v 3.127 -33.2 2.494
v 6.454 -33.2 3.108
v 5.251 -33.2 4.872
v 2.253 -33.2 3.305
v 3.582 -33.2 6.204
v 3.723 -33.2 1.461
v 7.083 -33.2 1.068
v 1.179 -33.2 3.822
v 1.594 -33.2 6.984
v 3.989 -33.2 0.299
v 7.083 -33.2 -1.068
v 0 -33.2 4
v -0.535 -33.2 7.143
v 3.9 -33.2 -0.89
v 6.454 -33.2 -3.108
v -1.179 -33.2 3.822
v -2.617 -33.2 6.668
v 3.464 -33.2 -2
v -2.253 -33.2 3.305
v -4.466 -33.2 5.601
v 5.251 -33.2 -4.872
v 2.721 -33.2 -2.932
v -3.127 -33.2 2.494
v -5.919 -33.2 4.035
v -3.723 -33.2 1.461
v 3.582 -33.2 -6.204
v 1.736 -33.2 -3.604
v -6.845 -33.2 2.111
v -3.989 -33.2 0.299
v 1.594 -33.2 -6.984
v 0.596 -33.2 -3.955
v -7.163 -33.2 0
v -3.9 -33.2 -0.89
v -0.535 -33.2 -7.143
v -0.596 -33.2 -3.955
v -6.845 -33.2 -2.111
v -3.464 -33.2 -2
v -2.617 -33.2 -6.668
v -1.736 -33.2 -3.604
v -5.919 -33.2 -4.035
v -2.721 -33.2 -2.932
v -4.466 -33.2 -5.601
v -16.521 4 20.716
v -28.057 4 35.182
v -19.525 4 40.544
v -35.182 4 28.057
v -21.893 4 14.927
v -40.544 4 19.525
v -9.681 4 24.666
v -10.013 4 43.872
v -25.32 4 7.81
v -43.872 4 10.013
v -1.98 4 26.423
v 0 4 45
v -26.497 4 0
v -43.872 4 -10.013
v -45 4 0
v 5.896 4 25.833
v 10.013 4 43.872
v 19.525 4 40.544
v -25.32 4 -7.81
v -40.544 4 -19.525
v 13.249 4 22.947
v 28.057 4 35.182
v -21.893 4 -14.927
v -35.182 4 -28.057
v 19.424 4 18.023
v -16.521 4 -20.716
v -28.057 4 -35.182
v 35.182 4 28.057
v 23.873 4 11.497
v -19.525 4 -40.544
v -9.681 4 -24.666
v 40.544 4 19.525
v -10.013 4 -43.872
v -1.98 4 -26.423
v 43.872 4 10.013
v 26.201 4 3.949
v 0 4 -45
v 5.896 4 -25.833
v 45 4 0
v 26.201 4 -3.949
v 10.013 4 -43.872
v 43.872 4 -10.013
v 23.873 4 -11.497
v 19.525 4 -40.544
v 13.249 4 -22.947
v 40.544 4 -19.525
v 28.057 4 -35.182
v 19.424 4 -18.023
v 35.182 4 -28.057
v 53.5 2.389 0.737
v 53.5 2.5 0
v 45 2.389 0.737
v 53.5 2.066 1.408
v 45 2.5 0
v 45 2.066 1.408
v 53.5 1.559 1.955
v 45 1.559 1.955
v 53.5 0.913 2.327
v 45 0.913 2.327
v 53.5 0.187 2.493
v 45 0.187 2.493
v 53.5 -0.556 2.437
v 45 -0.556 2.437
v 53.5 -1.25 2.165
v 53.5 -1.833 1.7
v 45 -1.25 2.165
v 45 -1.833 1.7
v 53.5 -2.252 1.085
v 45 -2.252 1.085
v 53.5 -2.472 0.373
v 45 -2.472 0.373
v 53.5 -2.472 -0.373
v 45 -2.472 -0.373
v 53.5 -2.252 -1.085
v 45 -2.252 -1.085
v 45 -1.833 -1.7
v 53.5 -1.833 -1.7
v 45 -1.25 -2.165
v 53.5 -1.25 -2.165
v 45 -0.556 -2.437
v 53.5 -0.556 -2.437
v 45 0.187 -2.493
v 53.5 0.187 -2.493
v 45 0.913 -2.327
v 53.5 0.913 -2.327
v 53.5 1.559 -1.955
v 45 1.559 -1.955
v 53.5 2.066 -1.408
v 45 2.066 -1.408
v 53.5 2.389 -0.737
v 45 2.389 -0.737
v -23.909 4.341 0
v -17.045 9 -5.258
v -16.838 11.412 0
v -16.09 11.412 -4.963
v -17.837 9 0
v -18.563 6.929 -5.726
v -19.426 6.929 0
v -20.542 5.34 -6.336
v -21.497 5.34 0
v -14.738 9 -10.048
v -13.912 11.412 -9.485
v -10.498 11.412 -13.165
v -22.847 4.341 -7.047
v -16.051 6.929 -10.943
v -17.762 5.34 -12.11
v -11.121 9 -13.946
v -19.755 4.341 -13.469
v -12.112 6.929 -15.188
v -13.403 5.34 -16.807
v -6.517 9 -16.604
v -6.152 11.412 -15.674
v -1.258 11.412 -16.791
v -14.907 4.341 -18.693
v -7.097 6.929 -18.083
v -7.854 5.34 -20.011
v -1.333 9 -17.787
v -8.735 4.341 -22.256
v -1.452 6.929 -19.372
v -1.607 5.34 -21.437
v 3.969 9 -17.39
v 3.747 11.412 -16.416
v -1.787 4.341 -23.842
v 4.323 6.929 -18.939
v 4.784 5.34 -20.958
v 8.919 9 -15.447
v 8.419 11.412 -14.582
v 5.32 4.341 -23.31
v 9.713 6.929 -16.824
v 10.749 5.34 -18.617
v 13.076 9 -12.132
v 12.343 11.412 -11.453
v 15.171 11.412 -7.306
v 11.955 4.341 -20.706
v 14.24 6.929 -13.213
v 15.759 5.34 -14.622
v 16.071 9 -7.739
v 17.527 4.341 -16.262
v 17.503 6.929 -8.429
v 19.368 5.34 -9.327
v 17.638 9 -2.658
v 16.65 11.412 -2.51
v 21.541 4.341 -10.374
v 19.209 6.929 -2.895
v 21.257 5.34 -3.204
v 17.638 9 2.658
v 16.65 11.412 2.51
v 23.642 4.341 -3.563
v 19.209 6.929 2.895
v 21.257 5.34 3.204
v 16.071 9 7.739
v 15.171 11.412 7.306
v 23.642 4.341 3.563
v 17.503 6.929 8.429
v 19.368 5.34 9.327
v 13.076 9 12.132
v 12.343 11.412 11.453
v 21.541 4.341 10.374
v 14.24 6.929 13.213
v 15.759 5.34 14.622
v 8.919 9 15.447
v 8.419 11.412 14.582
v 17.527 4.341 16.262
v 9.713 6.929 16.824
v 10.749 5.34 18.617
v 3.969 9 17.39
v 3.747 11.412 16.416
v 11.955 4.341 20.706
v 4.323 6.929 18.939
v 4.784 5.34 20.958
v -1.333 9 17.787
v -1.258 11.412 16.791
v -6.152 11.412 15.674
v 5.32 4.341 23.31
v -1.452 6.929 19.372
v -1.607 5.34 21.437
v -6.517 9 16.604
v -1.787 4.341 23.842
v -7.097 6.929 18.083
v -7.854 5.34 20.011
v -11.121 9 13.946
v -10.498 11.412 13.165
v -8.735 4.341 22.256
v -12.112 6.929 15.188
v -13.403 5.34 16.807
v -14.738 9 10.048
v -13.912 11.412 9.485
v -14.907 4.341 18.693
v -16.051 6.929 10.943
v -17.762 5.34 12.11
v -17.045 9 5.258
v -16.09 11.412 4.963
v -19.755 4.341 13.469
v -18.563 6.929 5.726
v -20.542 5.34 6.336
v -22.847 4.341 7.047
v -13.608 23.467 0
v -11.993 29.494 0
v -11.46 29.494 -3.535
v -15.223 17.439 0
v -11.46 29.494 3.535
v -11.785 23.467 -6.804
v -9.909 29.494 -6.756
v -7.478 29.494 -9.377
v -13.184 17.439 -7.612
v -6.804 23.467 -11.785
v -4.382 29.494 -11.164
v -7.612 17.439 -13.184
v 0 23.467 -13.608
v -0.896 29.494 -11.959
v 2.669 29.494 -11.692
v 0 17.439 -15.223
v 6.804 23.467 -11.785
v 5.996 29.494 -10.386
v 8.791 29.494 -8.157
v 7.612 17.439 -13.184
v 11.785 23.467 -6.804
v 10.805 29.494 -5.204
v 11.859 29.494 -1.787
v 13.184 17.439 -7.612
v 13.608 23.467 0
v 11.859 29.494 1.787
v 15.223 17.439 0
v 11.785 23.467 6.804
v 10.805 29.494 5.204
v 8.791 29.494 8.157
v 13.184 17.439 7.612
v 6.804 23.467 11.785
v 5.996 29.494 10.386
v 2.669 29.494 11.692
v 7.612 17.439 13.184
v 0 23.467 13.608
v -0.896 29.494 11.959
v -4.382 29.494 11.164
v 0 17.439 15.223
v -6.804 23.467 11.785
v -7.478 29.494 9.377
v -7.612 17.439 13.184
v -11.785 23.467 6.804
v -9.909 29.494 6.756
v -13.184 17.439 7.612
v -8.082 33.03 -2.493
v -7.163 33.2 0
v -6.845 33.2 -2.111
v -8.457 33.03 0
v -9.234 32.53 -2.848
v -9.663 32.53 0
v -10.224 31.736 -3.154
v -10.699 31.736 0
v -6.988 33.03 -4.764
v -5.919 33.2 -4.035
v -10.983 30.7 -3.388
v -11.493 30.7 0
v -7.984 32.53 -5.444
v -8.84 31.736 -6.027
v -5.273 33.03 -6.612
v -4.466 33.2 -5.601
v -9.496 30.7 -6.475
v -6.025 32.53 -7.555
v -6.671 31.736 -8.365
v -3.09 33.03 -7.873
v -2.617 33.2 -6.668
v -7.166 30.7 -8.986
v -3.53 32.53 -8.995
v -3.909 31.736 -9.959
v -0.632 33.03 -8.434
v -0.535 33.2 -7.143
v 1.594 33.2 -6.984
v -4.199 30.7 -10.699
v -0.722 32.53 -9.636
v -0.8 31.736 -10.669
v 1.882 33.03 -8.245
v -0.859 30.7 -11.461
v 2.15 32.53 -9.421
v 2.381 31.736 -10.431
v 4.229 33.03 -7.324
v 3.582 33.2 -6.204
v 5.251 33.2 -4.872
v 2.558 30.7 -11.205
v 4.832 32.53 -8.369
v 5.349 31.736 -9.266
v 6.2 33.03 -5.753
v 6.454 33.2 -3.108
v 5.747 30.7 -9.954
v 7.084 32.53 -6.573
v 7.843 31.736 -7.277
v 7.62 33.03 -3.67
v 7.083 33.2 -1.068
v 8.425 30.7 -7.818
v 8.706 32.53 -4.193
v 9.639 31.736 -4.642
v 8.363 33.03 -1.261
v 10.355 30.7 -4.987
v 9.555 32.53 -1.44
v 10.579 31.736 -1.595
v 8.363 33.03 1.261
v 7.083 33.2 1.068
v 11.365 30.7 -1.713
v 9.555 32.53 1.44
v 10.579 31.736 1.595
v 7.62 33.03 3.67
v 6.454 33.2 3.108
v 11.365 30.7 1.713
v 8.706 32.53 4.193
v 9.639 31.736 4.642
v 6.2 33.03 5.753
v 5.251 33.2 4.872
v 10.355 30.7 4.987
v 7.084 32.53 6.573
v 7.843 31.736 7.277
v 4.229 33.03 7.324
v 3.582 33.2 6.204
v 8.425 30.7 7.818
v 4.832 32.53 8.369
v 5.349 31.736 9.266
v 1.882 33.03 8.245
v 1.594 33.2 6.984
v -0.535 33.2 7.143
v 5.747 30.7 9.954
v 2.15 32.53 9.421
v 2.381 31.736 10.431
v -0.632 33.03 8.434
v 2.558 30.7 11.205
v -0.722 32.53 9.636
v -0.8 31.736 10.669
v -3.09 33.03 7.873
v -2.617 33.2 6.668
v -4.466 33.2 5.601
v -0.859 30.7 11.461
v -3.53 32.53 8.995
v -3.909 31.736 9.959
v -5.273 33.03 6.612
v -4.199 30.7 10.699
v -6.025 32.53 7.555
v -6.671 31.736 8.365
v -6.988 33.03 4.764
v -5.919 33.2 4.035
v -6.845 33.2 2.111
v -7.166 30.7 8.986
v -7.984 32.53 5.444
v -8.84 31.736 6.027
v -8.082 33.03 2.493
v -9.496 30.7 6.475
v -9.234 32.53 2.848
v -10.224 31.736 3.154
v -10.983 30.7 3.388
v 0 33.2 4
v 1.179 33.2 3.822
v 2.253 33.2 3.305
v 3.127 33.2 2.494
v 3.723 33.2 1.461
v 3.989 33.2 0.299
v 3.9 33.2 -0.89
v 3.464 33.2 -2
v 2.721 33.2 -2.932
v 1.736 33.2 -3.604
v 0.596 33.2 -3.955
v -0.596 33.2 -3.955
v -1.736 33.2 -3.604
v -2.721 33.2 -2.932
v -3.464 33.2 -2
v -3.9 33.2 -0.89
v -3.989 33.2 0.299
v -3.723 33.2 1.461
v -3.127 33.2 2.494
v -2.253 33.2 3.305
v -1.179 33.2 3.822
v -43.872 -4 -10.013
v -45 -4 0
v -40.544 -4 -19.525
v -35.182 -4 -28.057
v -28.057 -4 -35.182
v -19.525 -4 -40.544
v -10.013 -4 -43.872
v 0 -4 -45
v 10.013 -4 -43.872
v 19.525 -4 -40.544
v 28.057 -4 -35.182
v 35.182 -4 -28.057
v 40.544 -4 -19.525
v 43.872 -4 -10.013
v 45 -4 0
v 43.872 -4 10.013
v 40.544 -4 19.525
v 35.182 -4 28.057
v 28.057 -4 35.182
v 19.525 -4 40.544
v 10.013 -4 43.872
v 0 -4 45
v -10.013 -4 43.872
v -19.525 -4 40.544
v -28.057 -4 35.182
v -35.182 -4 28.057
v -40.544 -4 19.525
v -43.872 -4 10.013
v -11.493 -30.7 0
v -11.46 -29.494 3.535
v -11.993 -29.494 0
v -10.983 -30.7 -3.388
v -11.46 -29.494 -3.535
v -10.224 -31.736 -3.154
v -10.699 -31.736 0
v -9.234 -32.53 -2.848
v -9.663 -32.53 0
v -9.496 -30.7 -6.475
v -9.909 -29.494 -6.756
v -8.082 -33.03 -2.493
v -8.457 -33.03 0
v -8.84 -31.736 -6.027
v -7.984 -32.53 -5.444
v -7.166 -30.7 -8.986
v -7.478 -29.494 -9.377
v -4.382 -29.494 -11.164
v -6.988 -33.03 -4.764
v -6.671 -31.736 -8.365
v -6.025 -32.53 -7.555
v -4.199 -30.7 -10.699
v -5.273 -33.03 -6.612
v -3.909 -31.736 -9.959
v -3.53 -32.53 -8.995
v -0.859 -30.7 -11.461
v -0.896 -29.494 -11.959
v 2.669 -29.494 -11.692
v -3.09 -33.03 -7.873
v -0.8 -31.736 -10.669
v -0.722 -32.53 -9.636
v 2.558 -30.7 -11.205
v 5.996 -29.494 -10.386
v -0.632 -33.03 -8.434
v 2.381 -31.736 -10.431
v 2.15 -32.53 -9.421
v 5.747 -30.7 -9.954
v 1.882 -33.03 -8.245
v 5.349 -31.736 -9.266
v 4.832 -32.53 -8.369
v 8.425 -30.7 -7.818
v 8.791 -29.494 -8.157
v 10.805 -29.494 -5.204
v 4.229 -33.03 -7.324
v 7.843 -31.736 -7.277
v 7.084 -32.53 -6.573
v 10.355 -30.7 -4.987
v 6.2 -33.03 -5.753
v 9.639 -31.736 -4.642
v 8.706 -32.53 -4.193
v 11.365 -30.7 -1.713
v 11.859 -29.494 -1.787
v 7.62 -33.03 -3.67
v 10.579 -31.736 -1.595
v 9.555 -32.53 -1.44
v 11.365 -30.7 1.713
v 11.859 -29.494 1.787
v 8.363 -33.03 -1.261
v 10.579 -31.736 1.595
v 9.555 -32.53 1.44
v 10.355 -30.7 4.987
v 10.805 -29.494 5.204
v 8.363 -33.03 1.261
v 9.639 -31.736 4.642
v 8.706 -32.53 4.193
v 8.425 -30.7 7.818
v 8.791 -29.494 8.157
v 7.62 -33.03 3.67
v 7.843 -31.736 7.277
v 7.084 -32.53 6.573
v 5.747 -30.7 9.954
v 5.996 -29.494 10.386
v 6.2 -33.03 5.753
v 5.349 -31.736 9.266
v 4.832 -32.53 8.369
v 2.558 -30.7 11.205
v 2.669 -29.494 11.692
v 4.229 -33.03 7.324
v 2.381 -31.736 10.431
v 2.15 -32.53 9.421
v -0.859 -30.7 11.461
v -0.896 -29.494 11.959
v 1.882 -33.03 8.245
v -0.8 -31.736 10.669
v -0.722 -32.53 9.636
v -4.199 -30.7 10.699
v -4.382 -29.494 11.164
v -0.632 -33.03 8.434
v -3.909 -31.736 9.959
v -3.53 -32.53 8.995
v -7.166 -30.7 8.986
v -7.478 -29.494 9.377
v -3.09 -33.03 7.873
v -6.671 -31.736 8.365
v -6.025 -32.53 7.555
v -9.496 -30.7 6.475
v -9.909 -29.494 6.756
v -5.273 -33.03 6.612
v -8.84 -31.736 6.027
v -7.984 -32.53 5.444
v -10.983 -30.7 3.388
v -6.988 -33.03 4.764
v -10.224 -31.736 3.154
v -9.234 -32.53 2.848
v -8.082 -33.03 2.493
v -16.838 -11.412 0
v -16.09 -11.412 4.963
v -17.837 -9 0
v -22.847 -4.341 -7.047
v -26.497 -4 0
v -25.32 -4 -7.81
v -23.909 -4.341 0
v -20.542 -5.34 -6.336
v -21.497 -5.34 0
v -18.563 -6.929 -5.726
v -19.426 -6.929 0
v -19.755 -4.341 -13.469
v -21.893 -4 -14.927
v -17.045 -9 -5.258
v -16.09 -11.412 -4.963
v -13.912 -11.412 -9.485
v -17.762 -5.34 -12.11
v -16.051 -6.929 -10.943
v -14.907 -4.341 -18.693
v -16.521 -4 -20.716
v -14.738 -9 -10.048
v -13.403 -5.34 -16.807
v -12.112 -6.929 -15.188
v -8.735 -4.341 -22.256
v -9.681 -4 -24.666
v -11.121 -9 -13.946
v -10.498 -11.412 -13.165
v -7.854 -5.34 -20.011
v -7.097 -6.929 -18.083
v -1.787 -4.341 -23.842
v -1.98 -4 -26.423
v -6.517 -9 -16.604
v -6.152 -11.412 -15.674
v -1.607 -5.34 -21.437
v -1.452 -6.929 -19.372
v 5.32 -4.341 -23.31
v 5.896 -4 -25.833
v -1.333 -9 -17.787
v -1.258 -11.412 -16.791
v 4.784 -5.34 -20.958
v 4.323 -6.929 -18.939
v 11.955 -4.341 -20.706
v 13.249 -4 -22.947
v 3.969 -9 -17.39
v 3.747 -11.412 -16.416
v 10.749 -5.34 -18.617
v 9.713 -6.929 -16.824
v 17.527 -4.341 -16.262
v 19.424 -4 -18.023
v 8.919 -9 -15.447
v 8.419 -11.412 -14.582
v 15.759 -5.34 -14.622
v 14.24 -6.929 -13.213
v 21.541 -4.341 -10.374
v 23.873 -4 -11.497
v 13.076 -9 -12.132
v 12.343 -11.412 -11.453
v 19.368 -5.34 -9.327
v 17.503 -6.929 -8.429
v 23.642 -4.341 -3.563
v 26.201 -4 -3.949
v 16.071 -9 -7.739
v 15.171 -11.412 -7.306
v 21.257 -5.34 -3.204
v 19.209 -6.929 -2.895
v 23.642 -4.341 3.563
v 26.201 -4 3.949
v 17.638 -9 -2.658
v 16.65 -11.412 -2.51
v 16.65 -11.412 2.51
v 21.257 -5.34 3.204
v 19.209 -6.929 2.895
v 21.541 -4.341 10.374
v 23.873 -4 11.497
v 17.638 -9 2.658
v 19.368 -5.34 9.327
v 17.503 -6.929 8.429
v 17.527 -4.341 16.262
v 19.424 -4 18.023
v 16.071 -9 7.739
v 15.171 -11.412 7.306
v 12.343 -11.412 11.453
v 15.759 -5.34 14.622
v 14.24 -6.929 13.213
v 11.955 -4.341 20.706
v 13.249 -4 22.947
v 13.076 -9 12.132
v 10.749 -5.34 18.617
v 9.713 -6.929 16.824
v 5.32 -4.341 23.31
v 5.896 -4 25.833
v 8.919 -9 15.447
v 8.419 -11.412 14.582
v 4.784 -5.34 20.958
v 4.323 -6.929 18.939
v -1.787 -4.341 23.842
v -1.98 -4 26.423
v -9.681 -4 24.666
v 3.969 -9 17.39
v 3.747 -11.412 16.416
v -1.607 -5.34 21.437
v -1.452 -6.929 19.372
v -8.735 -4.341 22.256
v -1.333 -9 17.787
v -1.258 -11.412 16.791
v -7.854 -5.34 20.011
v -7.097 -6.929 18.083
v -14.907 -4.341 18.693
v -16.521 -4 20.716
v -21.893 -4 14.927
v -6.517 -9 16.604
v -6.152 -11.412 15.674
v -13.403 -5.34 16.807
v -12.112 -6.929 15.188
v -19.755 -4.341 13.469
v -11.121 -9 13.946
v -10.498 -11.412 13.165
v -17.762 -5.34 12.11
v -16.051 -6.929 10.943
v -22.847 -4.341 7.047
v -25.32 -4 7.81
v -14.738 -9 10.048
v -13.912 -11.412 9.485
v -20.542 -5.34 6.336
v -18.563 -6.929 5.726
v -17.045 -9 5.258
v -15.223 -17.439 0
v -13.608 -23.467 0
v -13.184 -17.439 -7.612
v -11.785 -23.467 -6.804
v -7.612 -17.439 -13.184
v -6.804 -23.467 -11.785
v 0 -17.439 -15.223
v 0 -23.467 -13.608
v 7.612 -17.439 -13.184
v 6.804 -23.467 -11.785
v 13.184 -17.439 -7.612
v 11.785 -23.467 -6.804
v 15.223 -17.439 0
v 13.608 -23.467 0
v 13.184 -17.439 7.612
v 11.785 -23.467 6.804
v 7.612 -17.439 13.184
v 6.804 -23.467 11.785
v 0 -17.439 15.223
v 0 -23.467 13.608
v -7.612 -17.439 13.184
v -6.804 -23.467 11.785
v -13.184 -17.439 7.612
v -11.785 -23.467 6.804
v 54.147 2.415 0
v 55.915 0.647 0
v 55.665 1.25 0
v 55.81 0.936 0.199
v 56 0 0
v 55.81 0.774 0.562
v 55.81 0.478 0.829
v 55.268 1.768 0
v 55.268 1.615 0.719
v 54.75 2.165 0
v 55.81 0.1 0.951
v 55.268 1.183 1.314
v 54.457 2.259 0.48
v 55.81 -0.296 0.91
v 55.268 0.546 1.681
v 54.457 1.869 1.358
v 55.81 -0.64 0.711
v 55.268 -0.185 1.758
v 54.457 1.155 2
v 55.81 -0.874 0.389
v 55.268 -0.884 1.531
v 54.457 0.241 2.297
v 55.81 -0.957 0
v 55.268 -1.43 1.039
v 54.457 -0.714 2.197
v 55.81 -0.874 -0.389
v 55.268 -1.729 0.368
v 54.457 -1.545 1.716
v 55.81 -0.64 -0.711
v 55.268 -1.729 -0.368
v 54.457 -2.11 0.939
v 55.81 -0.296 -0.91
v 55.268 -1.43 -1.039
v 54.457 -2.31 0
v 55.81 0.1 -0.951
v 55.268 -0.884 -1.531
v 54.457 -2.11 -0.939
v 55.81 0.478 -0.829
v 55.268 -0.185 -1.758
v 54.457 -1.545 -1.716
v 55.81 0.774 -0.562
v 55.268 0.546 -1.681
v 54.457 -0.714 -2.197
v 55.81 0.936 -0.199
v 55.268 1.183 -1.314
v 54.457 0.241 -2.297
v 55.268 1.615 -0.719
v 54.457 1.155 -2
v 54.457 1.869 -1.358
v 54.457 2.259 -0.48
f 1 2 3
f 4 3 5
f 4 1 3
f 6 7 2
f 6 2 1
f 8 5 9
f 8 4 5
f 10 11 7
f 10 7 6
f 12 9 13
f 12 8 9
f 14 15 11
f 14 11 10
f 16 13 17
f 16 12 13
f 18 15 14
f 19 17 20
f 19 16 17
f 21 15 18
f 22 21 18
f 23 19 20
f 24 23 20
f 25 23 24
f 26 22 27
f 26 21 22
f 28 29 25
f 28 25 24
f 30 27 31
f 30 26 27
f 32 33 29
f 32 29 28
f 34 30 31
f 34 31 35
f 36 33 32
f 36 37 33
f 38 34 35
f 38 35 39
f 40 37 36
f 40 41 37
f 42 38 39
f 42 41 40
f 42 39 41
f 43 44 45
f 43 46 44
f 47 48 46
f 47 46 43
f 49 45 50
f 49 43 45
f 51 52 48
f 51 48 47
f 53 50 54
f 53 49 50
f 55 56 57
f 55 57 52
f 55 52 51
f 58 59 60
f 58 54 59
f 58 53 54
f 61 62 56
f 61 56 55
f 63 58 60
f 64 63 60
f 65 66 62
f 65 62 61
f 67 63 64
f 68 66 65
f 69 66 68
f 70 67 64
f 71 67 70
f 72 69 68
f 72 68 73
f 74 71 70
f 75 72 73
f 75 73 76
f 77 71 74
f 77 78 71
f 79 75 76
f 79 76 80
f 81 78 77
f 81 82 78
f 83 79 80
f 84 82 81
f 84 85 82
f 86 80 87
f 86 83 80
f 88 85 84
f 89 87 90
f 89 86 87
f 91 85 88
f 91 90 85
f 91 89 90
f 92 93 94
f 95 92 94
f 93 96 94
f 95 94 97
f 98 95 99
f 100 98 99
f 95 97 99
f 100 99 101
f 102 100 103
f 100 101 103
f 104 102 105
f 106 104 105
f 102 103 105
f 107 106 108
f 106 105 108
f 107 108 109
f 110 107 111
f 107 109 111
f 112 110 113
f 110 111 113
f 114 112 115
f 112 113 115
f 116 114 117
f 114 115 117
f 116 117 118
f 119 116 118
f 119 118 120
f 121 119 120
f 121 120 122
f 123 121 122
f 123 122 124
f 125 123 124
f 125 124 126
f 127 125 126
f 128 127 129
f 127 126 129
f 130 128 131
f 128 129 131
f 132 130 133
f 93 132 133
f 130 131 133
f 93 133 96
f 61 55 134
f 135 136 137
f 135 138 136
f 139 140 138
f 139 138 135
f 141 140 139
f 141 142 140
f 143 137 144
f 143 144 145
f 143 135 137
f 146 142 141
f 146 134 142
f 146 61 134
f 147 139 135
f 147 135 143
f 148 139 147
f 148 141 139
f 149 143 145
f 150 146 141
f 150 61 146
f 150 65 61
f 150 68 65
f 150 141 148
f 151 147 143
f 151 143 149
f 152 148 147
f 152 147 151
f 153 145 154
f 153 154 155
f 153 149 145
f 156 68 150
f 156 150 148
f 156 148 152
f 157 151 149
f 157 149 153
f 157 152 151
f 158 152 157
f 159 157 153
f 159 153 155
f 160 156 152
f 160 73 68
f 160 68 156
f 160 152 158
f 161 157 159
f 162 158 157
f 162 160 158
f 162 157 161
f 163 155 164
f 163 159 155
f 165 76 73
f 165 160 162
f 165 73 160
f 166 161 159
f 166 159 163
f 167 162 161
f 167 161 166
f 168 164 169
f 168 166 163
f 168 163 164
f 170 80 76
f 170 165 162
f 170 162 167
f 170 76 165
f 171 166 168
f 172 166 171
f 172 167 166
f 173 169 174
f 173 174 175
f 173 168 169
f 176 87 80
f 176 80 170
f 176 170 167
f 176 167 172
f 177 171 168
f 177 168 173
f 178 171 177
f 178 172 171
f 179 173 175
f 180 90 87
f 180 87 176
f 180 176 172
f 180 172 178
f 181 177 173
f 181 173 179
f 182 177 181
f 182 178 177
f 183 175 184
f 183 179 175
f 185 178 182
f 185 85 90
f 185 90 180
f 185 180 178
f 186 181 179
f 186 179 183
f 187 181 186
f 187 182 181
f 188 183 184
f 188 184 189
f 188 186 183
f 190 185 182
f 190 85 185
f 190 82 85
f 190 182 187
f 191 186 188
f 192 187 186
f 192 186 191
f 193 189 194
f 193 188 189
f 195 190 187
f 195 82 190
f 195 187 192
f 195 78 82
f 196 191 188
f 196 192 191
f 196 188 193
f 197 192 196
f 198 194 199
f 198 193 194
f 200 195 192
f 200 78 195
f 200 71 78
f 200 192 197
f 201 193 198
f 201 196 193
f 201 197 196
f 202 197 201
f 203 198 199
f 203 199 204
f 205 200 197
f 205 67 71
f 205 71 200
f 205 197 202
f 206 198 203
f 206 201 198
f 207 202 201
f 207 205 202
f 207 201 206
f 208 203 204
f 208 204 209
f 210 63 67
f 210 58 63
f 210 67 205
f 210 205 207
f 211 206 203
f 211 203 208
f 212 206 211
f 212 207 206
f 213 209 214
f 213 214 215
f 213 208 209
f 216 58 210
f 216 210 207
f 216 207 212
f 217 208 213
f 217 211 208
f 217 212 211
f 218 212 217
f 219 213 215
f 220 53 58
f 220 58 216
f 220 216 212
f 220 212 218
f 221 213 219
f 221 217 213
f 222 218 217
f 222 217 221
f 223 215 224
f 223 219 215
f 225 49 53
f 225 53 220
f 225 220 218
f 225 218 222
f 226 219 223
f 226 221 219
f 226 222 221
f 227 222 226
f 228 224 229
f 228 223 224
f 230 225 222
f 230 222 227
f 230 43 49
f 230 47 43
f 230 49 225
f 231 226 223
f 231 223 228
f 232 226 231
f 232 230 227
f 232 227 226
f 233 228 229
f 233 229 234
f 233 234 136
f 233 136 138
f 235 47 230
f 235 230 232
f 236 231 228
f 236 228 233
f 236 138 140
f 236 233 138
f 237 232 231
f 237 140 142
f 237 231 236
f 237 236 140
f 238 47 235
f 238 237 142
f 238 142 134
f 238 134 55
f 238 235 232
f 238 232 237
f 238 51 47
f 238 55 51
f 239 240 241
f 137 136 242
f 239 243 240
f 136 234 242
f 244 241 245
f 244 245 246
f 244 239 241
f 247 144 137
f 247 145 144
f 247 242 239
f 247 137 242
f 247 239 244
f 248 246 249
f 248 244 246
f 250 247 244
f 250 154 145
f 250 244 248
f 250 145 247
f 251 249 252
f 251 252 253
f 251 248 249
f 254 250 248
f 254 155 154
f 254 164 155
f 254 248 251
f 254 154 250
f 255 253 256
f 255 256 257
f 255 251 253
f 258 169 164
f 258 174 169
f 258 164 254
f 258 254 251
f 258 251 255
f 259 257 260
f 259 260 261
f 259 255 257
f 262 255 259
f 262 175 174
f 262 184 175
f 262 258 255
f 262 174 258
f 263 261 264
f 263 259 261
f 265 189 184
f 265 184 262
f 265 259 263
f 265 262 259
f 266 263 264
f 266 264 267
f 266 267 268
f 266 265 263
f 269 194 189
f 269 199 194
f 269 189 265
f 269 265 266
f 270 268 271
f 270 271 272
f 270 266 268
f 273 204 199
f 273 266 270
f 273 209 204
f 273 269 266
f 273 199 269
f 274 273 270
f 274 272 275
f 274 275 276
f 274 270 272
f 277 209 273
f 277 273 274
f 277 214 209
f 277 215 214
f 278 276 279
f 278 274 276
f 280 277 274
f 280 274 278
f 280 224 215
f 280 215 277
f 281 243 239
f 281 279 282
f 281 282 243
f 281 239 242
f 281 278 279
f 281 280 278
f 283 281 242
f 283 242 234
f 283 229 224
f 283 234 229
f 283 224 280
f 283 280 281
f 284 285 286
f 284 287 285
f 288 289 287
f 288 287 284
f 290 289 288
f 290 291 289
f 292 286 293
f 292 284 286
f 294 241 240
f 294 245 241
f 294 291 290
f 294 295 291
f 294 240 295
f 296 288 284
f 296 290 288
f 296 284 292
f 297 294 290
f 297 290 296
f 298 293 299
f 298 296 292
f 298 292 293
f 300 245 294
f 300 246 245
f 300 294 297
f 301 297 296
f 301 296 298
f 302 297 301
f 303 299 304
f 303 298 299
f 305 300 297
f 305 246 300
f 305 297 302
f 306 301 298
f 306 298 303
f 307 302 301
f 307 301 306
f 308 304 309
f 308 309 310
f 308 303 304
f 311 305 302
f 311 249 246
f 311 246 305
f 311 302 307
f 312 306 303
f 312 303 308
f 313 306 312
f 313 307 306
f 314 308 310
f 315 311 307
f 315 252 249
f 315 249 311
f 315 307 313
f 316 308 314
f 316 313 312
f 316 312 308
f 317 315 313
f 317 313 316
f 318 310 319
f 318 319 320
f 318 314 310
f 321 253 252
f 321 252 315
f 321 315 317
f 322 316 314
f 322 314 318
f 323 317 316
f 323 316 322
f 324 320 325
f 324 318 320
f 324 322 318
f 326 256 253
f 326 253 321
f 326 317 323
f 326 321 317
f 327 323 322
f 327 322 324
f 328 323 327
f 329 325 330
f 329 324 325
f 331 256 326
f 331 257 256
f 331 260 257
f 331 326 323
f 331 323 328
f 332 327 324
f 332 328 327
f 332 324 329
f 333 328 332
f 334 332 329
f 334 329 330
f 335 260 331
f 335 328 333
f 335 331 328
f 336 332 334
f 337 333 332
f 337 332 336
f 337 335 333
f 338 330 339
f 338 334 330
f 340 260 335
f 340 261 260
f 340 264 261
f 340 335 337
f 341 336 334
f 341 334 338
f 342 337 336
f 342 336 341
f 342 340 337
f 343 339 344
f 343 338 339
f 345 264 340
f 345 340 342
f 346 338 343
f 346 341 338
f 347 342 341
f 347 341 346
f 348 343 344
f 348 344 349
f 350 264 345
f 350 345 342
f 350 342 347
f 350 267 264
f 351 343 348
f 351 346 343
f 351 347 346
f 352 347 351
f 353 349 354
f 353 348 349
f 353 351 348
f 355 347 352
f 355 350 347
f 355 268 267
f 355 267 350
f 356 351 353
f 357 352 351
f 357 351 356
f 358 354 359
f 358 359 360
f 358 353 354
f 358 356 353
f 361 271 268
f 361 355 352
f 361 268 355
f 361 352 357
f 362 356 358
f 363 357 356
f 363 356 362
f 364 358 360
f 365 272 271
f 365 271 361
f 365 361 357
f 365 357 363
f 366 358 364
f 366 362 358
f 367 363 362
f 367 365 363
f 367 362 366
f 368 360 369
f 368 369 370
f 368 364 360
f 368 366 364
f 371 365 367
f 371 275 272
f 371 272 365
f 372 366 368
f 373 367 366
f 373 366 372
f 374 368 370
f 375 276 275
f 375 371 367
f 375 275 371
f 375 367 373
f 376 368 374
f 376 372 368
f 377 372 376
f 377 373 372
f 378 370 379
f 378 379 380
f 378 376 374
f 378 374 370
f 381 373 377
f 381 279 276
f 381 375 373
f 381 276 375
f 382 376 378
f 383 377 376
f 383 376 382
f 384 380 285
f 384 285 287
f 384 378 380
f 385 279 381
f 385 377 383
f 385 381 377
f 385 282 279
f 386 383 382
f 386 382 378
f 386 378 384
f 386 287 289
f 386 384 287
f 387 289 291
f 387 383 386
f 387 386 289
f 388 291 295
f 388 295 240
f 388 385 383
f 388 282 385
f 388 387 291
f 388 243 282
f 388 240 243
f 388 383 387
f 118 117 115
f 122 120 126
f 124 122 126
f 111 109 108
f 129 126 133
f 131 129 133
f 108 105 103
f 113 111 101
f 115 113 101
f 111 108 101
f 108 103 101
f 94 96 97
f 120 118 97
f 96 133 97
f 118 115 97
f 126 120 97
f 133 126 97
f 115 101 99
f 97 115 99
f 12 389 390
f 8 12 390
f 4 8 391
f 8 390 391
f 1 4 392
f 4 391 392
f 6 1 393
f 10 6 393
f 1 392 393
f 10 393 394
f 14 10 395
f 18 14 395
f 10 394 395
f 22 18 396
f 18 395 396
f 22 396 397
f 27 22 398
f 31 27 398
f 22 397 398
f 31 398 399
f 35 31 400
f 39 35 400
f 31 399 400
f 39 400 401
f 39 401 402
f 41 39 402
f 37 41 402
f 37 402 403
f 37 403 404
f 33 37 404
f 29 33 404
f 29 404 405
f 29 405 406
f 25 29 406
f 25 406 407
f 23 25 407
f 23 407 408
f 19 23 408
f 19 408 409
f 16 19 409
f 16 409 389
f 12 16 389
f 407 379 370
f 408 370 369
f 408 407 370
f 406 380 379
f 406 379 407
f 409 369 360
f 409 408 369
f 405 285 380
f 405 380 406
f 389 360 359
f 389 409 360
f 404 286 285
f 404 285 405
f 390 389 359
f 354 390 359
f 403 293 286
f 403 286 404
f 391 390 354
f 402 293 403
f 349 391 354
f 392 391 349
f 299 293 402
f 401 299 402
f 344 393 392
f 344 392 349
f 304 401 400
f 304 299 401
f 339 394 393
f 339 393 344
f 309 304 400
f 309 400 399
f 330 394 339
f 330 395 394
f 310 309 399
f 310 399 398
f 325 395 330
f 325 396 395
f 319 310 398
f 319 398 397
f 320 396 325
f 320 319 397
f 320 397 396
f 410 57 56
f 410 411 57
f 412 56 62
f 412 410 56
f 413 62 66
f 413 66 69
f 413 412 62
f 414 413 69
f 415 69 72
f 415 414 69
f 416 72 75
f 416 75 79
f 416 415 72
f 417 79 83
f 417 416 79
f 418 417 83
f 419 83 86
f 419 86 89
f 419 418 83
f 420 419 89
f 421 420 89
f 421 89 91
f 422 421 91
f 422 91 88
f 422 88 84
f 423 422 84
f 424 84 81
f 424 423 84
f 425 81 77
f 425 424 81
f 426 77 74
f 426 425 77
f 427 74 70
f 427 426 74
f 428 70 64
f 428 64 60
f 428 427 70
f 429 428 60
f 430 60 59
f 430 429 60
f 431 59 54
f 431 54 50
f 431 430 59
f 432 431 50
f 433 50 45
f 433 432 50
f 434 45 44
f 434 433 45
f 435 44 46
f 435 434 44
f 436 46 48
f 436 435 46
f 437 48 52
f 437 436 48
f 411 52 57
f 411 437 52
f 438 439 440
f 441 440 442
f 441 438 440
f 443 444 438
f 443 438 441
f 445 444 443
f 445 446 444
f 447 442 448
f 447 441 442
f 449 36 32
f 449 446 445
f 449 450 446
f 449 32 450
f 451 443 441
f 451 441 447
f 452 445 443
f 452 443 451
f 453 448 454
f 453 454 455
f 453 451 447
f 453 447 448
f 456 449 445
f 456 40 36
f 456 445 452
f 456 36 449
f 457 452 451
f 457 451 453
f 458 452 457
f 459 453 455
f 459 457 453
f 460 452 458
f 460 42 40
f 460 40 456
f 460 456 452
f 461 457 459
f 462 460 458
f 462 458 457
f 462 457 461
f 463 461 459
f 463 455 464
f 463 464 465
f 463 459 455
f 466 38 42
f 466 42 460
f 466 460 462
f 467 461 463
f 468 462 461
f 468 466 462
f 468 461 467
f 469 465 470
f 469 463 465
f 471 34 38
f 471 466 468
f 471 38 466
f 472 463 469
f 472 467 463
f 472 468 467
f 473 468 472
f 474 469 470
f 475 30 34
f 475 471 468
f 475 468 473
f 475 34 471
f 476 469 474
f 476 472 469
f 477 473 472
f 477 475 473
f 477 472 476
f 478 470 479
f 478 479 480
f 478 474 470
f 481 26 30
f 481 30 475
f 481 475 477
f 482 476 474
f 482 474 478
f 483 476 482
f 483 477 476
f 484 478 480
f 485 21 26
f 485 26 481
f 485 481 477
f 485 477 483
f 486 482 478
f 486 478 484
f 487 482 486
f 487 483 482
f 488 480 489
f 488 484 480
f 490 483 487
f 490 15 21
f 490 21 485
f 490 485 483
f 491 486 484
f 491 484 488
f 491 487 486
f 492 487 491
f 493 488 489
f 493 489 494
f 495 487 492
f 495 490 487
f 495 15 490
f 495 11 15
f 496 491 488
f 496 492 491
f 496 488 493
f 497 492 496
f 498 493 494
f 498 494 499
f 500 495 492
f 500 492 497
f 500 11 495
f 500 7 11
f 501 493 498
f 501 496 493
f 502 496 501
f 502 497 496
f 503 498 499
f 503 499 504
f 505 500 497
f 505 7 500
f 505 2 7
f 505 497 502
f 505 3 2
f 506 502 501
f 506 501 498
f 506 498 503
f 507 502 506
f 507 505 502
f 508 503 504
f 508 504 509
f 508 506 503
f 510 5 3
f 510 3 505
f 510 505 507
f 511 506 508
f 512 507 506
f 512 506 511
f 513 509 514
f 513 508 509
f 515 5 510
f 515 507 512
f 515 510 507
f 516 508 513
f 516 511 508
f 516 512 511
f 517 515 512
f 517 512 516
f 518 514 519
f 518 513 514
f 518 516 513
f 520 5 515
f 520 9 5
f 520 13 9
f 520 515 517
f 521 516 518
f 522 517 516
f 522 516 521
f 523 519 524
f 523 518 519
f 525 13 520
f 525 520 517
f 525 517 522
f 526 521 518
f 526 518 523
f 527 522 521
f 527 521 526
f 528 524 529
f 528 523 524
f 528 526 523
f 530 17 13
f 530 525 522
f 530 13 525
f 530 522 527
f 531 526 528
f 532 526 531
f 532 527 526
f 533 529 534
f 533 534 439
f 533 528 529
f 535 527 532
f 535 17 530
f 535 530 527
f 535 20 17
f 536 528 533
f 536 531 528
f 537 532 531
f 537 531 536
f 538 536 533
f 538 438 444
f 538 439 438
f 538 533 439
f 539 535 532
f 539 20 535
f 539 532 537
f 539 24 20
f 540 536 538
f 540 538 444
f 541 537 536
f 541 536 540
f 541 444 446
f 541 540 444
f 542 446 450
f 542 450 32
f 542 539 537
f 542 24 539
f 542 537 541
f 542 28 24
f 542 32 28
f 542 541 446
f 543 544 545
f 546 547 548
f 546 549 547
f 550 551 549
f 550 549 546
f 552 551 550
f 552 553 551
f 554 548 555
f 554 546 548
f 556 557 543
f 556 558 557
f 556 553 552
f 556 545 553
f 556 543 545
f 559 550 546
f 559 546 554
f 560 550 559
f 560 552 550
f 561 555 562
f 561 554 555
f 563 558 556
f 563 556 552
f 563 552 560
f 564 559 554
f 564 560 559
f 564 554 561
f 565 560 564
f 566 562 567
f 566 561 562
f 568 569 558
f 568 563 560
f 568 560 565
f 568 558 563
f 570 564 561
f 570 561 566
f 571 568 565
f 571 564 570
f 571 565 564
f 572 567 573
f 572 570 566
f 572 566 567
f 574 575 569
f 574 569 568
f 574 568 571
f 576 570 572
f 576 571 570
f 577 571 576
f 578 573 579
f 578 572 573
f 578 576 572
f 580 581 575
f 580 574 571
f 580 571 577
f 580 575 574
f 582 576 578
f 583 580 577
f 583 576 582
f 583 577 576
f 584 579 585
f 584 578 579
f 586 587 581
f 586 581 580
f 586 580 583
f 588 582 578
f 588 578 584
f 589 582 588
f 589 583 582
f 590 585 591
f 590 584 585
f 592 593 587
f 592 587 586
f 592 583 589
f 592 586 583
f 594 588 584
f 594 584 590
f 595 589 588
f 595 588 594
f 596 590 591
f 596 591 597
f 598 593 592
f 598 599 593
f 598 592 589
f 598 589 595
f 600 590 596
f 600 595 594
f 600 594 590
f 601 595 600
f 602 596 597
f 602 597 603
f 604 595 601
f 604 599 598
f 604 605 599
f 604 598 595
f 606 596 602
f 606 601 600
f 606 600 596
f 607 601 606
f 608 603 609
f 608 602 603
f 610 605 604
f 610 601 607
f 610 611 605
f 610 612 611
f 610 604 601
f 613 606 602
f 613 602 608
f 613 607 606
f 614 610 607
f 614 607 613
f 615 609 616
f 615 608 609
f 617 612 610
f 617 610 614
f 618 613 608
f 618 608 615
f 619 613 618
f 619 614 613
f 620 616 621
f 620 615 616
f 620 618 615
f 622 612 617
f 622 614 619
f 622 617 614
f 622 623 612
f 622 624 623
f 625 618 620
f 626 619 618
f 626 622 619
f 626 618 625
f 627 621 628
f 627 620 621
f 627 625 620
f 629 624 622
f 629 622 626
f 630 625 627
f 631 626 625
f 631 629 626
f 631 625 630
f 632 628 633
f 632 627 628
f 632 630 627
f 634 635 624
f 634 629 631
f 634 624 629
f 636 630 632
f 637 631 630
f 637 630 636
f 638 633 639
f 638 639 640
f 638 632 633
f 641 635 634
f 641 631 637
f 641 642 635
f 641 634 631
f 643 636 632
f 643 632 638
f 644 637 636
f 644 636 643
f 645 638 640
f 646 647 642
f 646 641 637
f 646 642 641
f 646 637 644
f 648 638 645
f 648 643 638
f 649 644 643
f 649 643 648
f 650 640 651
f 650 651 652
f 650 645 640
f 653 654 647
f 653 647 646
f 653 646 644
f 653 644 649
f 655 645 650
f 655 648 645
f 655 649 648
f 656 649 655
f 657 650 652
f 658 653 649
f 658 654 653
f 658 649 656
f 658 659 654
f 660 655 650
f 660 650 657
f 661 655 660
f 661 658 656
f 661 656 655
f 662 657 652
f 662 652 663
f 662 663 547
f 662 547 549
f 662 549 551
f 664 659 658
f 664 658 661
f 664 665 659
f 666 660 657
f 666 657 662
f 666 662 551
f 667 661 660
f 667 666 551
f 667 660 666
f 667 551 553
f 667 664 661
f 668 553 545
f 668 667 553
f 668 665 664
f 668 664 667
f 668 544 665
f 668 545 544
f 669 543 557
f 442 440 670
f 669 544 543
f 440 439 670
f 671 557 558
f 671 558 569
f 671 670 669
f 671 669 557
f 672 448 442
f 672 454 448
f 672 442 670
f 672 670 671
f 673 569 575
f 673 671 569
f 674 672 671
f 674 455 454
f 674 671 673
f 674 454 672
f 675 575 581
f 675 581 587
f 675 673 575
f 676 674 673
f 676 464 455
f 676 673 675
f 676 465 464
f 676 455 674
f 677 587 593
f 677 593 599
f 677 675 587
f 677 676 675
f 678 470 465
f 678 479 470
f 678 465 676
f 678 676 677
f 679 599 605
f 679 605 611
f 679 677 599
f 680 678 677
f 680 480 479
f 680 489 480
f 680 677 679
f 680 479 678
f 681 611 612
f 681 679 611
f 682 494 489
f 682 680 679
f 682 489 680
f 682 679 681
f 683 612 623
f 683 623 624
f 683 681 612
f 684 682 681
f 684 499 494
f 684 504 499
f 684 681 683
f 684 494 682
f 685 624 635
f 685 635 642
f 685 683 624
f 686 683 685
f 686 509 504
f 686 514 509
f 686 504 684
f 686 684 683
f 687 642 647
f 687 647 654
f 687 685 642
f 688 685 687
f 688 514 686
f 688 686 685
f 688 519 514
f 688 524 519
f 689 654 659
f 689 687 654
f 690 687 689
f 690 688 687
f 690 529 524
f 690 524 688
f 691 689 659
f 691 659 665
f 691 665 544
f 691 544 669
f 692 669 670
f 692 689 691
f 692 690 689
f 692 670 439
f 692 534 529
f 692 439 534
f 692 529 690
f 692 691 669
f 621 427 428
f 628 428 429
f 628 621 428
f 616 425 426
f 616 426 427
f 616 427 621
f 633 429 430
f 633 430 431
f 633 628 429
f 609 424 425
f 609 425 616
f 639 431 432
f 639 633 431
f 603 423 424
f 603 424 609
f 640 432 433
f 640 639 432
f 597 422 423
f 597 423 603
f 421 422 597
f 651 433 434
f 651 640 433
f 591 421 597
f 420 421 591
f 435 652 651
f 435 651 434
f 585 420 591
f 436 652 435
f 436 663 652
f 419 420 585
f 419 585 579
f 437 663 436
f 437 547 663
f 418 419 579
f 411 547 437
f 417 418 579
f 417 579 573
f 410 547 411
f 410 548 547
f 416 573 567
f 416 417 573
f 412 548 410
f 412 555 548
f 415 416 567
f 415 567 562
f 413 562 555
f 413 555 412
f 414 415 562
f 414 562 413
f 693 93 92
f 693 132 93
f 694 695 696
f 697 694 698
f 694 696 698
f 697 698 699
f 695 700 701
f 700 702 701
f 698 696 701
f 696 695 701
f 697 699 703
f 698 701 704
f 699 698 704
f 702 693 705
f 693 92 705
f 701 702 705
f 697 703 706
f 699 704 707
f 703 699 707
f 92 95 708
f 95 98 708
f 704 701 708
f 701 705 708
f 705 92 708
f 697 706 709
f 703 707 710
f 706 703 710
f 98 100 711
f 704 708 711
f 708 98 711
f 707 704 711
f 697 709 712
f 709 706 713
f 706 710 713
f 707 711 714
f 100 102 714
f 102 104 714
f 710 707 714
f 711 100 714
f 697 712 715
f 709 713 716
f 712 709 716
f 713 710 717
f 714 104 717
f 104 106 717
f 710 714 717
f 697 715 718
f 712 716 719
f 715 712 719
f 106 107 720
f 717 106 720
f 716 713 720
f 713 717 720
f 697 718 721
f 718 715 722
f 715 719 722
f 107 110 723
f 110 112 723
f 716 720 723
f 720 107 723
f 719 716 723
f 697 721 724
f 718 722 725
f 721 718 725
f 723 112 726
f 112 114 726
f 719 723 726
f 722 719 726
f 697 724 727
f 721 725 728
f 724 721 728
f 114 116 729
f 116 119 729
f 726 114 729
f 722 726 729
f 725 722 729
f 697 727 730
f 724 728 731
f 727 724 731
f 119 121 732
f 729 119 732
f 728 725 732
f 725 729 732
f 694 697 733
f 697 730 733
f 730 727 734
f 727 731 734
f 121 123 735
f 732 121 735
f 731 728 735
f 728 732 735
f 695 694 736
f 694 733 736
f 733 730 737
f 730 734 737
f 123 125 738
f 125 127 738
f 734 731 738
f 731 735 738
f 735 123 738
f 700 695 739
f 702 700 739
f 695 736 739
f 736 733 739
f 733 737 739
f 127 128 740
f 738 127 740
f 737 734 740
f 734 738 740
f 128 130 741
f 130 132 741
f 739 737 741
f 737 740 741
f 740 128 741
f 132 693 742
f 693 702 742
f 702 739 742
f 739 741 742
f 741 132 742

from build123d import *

# Parameters (mm, degrees)
SKETCH2_R          = 4
CUT_EXTRUDE1_DEPTH = 92.972604617


with BuildPart() as part:
    # Sketch1 → Revolve1 (revolve)
    with BuildSketch(Plane.XY):
        with BuildLine():
            Line((0, 33.2), (-7.16336506, 33.2))
            ThreePointArc((-7.16336506, 33.2), (-10.207172205, 32.166766701), (-11.992994192, 29.494095226))
            Line((-11.992994192, 29.494095226), (-16.838128036, 11.411809549))
            ThreePointArc((-16.838128036, 11.411809549), (-20.409772009, 6.066466597), (-26.497386299, 4))
            Line((-26.497386299, 4), (-45, 4))
            Line((-45, 4), (-45, -4))
            Line((-45, -4), (-26.497386299, -4))
            ThreePointArc((-26.497386299, -4), (-20.409772009, -6.066466597), (-16.838128036, -11.411809549))
            Line((-16.838128036, -11.411809549), (-11.992994192, -29.494095226))
            ThreePointArc((-11.992994192, -29.494095226), (-10.207172205, -32.166766701), (-7.16336506, -33.2))
            Line((-7.16336506, -33.2), (0, -33.2))
            Line((0, -33.2), (0, 33.2))
        make_face()
    revolve(axis=Axis((0, 33.2, 0), (0, -1, 0)))

    # Sketch2 → Cut-Extrude1 (cut, through all)
    with BuildSketch(Plane(origin=(0, 33.2, 0), x_dir=(1, 0, 0), z_dir=(0, 1, 0))):
        with Locations(Location((0, 0, 0), (0, 0, 270))):
            Circle(SKETCH2_R)
    extrude(amount=-CUT_EXTRUDE1_DEPTH, mode=Mode.SUBTRACT)


with BuildPart() as body_2:
    # Sketch3 → Revolve2 (revolve)
    with BuildSketch(Plane.XY):
        with BuildLine():
            Line((53.5, 2.5), (45, 2.5))
            Line((45, 2.5), (45, 0))
            Line((45, 0), (56, 0))
            ThreePointArc((56, 0), (55.267766953, 1.767766953), (53.5, 2.5))
        make_face()
    revolve(axis=Axis((0, 0, 0), (1, 0, 0)))


solid = Compound([part.part, body_2.part])
